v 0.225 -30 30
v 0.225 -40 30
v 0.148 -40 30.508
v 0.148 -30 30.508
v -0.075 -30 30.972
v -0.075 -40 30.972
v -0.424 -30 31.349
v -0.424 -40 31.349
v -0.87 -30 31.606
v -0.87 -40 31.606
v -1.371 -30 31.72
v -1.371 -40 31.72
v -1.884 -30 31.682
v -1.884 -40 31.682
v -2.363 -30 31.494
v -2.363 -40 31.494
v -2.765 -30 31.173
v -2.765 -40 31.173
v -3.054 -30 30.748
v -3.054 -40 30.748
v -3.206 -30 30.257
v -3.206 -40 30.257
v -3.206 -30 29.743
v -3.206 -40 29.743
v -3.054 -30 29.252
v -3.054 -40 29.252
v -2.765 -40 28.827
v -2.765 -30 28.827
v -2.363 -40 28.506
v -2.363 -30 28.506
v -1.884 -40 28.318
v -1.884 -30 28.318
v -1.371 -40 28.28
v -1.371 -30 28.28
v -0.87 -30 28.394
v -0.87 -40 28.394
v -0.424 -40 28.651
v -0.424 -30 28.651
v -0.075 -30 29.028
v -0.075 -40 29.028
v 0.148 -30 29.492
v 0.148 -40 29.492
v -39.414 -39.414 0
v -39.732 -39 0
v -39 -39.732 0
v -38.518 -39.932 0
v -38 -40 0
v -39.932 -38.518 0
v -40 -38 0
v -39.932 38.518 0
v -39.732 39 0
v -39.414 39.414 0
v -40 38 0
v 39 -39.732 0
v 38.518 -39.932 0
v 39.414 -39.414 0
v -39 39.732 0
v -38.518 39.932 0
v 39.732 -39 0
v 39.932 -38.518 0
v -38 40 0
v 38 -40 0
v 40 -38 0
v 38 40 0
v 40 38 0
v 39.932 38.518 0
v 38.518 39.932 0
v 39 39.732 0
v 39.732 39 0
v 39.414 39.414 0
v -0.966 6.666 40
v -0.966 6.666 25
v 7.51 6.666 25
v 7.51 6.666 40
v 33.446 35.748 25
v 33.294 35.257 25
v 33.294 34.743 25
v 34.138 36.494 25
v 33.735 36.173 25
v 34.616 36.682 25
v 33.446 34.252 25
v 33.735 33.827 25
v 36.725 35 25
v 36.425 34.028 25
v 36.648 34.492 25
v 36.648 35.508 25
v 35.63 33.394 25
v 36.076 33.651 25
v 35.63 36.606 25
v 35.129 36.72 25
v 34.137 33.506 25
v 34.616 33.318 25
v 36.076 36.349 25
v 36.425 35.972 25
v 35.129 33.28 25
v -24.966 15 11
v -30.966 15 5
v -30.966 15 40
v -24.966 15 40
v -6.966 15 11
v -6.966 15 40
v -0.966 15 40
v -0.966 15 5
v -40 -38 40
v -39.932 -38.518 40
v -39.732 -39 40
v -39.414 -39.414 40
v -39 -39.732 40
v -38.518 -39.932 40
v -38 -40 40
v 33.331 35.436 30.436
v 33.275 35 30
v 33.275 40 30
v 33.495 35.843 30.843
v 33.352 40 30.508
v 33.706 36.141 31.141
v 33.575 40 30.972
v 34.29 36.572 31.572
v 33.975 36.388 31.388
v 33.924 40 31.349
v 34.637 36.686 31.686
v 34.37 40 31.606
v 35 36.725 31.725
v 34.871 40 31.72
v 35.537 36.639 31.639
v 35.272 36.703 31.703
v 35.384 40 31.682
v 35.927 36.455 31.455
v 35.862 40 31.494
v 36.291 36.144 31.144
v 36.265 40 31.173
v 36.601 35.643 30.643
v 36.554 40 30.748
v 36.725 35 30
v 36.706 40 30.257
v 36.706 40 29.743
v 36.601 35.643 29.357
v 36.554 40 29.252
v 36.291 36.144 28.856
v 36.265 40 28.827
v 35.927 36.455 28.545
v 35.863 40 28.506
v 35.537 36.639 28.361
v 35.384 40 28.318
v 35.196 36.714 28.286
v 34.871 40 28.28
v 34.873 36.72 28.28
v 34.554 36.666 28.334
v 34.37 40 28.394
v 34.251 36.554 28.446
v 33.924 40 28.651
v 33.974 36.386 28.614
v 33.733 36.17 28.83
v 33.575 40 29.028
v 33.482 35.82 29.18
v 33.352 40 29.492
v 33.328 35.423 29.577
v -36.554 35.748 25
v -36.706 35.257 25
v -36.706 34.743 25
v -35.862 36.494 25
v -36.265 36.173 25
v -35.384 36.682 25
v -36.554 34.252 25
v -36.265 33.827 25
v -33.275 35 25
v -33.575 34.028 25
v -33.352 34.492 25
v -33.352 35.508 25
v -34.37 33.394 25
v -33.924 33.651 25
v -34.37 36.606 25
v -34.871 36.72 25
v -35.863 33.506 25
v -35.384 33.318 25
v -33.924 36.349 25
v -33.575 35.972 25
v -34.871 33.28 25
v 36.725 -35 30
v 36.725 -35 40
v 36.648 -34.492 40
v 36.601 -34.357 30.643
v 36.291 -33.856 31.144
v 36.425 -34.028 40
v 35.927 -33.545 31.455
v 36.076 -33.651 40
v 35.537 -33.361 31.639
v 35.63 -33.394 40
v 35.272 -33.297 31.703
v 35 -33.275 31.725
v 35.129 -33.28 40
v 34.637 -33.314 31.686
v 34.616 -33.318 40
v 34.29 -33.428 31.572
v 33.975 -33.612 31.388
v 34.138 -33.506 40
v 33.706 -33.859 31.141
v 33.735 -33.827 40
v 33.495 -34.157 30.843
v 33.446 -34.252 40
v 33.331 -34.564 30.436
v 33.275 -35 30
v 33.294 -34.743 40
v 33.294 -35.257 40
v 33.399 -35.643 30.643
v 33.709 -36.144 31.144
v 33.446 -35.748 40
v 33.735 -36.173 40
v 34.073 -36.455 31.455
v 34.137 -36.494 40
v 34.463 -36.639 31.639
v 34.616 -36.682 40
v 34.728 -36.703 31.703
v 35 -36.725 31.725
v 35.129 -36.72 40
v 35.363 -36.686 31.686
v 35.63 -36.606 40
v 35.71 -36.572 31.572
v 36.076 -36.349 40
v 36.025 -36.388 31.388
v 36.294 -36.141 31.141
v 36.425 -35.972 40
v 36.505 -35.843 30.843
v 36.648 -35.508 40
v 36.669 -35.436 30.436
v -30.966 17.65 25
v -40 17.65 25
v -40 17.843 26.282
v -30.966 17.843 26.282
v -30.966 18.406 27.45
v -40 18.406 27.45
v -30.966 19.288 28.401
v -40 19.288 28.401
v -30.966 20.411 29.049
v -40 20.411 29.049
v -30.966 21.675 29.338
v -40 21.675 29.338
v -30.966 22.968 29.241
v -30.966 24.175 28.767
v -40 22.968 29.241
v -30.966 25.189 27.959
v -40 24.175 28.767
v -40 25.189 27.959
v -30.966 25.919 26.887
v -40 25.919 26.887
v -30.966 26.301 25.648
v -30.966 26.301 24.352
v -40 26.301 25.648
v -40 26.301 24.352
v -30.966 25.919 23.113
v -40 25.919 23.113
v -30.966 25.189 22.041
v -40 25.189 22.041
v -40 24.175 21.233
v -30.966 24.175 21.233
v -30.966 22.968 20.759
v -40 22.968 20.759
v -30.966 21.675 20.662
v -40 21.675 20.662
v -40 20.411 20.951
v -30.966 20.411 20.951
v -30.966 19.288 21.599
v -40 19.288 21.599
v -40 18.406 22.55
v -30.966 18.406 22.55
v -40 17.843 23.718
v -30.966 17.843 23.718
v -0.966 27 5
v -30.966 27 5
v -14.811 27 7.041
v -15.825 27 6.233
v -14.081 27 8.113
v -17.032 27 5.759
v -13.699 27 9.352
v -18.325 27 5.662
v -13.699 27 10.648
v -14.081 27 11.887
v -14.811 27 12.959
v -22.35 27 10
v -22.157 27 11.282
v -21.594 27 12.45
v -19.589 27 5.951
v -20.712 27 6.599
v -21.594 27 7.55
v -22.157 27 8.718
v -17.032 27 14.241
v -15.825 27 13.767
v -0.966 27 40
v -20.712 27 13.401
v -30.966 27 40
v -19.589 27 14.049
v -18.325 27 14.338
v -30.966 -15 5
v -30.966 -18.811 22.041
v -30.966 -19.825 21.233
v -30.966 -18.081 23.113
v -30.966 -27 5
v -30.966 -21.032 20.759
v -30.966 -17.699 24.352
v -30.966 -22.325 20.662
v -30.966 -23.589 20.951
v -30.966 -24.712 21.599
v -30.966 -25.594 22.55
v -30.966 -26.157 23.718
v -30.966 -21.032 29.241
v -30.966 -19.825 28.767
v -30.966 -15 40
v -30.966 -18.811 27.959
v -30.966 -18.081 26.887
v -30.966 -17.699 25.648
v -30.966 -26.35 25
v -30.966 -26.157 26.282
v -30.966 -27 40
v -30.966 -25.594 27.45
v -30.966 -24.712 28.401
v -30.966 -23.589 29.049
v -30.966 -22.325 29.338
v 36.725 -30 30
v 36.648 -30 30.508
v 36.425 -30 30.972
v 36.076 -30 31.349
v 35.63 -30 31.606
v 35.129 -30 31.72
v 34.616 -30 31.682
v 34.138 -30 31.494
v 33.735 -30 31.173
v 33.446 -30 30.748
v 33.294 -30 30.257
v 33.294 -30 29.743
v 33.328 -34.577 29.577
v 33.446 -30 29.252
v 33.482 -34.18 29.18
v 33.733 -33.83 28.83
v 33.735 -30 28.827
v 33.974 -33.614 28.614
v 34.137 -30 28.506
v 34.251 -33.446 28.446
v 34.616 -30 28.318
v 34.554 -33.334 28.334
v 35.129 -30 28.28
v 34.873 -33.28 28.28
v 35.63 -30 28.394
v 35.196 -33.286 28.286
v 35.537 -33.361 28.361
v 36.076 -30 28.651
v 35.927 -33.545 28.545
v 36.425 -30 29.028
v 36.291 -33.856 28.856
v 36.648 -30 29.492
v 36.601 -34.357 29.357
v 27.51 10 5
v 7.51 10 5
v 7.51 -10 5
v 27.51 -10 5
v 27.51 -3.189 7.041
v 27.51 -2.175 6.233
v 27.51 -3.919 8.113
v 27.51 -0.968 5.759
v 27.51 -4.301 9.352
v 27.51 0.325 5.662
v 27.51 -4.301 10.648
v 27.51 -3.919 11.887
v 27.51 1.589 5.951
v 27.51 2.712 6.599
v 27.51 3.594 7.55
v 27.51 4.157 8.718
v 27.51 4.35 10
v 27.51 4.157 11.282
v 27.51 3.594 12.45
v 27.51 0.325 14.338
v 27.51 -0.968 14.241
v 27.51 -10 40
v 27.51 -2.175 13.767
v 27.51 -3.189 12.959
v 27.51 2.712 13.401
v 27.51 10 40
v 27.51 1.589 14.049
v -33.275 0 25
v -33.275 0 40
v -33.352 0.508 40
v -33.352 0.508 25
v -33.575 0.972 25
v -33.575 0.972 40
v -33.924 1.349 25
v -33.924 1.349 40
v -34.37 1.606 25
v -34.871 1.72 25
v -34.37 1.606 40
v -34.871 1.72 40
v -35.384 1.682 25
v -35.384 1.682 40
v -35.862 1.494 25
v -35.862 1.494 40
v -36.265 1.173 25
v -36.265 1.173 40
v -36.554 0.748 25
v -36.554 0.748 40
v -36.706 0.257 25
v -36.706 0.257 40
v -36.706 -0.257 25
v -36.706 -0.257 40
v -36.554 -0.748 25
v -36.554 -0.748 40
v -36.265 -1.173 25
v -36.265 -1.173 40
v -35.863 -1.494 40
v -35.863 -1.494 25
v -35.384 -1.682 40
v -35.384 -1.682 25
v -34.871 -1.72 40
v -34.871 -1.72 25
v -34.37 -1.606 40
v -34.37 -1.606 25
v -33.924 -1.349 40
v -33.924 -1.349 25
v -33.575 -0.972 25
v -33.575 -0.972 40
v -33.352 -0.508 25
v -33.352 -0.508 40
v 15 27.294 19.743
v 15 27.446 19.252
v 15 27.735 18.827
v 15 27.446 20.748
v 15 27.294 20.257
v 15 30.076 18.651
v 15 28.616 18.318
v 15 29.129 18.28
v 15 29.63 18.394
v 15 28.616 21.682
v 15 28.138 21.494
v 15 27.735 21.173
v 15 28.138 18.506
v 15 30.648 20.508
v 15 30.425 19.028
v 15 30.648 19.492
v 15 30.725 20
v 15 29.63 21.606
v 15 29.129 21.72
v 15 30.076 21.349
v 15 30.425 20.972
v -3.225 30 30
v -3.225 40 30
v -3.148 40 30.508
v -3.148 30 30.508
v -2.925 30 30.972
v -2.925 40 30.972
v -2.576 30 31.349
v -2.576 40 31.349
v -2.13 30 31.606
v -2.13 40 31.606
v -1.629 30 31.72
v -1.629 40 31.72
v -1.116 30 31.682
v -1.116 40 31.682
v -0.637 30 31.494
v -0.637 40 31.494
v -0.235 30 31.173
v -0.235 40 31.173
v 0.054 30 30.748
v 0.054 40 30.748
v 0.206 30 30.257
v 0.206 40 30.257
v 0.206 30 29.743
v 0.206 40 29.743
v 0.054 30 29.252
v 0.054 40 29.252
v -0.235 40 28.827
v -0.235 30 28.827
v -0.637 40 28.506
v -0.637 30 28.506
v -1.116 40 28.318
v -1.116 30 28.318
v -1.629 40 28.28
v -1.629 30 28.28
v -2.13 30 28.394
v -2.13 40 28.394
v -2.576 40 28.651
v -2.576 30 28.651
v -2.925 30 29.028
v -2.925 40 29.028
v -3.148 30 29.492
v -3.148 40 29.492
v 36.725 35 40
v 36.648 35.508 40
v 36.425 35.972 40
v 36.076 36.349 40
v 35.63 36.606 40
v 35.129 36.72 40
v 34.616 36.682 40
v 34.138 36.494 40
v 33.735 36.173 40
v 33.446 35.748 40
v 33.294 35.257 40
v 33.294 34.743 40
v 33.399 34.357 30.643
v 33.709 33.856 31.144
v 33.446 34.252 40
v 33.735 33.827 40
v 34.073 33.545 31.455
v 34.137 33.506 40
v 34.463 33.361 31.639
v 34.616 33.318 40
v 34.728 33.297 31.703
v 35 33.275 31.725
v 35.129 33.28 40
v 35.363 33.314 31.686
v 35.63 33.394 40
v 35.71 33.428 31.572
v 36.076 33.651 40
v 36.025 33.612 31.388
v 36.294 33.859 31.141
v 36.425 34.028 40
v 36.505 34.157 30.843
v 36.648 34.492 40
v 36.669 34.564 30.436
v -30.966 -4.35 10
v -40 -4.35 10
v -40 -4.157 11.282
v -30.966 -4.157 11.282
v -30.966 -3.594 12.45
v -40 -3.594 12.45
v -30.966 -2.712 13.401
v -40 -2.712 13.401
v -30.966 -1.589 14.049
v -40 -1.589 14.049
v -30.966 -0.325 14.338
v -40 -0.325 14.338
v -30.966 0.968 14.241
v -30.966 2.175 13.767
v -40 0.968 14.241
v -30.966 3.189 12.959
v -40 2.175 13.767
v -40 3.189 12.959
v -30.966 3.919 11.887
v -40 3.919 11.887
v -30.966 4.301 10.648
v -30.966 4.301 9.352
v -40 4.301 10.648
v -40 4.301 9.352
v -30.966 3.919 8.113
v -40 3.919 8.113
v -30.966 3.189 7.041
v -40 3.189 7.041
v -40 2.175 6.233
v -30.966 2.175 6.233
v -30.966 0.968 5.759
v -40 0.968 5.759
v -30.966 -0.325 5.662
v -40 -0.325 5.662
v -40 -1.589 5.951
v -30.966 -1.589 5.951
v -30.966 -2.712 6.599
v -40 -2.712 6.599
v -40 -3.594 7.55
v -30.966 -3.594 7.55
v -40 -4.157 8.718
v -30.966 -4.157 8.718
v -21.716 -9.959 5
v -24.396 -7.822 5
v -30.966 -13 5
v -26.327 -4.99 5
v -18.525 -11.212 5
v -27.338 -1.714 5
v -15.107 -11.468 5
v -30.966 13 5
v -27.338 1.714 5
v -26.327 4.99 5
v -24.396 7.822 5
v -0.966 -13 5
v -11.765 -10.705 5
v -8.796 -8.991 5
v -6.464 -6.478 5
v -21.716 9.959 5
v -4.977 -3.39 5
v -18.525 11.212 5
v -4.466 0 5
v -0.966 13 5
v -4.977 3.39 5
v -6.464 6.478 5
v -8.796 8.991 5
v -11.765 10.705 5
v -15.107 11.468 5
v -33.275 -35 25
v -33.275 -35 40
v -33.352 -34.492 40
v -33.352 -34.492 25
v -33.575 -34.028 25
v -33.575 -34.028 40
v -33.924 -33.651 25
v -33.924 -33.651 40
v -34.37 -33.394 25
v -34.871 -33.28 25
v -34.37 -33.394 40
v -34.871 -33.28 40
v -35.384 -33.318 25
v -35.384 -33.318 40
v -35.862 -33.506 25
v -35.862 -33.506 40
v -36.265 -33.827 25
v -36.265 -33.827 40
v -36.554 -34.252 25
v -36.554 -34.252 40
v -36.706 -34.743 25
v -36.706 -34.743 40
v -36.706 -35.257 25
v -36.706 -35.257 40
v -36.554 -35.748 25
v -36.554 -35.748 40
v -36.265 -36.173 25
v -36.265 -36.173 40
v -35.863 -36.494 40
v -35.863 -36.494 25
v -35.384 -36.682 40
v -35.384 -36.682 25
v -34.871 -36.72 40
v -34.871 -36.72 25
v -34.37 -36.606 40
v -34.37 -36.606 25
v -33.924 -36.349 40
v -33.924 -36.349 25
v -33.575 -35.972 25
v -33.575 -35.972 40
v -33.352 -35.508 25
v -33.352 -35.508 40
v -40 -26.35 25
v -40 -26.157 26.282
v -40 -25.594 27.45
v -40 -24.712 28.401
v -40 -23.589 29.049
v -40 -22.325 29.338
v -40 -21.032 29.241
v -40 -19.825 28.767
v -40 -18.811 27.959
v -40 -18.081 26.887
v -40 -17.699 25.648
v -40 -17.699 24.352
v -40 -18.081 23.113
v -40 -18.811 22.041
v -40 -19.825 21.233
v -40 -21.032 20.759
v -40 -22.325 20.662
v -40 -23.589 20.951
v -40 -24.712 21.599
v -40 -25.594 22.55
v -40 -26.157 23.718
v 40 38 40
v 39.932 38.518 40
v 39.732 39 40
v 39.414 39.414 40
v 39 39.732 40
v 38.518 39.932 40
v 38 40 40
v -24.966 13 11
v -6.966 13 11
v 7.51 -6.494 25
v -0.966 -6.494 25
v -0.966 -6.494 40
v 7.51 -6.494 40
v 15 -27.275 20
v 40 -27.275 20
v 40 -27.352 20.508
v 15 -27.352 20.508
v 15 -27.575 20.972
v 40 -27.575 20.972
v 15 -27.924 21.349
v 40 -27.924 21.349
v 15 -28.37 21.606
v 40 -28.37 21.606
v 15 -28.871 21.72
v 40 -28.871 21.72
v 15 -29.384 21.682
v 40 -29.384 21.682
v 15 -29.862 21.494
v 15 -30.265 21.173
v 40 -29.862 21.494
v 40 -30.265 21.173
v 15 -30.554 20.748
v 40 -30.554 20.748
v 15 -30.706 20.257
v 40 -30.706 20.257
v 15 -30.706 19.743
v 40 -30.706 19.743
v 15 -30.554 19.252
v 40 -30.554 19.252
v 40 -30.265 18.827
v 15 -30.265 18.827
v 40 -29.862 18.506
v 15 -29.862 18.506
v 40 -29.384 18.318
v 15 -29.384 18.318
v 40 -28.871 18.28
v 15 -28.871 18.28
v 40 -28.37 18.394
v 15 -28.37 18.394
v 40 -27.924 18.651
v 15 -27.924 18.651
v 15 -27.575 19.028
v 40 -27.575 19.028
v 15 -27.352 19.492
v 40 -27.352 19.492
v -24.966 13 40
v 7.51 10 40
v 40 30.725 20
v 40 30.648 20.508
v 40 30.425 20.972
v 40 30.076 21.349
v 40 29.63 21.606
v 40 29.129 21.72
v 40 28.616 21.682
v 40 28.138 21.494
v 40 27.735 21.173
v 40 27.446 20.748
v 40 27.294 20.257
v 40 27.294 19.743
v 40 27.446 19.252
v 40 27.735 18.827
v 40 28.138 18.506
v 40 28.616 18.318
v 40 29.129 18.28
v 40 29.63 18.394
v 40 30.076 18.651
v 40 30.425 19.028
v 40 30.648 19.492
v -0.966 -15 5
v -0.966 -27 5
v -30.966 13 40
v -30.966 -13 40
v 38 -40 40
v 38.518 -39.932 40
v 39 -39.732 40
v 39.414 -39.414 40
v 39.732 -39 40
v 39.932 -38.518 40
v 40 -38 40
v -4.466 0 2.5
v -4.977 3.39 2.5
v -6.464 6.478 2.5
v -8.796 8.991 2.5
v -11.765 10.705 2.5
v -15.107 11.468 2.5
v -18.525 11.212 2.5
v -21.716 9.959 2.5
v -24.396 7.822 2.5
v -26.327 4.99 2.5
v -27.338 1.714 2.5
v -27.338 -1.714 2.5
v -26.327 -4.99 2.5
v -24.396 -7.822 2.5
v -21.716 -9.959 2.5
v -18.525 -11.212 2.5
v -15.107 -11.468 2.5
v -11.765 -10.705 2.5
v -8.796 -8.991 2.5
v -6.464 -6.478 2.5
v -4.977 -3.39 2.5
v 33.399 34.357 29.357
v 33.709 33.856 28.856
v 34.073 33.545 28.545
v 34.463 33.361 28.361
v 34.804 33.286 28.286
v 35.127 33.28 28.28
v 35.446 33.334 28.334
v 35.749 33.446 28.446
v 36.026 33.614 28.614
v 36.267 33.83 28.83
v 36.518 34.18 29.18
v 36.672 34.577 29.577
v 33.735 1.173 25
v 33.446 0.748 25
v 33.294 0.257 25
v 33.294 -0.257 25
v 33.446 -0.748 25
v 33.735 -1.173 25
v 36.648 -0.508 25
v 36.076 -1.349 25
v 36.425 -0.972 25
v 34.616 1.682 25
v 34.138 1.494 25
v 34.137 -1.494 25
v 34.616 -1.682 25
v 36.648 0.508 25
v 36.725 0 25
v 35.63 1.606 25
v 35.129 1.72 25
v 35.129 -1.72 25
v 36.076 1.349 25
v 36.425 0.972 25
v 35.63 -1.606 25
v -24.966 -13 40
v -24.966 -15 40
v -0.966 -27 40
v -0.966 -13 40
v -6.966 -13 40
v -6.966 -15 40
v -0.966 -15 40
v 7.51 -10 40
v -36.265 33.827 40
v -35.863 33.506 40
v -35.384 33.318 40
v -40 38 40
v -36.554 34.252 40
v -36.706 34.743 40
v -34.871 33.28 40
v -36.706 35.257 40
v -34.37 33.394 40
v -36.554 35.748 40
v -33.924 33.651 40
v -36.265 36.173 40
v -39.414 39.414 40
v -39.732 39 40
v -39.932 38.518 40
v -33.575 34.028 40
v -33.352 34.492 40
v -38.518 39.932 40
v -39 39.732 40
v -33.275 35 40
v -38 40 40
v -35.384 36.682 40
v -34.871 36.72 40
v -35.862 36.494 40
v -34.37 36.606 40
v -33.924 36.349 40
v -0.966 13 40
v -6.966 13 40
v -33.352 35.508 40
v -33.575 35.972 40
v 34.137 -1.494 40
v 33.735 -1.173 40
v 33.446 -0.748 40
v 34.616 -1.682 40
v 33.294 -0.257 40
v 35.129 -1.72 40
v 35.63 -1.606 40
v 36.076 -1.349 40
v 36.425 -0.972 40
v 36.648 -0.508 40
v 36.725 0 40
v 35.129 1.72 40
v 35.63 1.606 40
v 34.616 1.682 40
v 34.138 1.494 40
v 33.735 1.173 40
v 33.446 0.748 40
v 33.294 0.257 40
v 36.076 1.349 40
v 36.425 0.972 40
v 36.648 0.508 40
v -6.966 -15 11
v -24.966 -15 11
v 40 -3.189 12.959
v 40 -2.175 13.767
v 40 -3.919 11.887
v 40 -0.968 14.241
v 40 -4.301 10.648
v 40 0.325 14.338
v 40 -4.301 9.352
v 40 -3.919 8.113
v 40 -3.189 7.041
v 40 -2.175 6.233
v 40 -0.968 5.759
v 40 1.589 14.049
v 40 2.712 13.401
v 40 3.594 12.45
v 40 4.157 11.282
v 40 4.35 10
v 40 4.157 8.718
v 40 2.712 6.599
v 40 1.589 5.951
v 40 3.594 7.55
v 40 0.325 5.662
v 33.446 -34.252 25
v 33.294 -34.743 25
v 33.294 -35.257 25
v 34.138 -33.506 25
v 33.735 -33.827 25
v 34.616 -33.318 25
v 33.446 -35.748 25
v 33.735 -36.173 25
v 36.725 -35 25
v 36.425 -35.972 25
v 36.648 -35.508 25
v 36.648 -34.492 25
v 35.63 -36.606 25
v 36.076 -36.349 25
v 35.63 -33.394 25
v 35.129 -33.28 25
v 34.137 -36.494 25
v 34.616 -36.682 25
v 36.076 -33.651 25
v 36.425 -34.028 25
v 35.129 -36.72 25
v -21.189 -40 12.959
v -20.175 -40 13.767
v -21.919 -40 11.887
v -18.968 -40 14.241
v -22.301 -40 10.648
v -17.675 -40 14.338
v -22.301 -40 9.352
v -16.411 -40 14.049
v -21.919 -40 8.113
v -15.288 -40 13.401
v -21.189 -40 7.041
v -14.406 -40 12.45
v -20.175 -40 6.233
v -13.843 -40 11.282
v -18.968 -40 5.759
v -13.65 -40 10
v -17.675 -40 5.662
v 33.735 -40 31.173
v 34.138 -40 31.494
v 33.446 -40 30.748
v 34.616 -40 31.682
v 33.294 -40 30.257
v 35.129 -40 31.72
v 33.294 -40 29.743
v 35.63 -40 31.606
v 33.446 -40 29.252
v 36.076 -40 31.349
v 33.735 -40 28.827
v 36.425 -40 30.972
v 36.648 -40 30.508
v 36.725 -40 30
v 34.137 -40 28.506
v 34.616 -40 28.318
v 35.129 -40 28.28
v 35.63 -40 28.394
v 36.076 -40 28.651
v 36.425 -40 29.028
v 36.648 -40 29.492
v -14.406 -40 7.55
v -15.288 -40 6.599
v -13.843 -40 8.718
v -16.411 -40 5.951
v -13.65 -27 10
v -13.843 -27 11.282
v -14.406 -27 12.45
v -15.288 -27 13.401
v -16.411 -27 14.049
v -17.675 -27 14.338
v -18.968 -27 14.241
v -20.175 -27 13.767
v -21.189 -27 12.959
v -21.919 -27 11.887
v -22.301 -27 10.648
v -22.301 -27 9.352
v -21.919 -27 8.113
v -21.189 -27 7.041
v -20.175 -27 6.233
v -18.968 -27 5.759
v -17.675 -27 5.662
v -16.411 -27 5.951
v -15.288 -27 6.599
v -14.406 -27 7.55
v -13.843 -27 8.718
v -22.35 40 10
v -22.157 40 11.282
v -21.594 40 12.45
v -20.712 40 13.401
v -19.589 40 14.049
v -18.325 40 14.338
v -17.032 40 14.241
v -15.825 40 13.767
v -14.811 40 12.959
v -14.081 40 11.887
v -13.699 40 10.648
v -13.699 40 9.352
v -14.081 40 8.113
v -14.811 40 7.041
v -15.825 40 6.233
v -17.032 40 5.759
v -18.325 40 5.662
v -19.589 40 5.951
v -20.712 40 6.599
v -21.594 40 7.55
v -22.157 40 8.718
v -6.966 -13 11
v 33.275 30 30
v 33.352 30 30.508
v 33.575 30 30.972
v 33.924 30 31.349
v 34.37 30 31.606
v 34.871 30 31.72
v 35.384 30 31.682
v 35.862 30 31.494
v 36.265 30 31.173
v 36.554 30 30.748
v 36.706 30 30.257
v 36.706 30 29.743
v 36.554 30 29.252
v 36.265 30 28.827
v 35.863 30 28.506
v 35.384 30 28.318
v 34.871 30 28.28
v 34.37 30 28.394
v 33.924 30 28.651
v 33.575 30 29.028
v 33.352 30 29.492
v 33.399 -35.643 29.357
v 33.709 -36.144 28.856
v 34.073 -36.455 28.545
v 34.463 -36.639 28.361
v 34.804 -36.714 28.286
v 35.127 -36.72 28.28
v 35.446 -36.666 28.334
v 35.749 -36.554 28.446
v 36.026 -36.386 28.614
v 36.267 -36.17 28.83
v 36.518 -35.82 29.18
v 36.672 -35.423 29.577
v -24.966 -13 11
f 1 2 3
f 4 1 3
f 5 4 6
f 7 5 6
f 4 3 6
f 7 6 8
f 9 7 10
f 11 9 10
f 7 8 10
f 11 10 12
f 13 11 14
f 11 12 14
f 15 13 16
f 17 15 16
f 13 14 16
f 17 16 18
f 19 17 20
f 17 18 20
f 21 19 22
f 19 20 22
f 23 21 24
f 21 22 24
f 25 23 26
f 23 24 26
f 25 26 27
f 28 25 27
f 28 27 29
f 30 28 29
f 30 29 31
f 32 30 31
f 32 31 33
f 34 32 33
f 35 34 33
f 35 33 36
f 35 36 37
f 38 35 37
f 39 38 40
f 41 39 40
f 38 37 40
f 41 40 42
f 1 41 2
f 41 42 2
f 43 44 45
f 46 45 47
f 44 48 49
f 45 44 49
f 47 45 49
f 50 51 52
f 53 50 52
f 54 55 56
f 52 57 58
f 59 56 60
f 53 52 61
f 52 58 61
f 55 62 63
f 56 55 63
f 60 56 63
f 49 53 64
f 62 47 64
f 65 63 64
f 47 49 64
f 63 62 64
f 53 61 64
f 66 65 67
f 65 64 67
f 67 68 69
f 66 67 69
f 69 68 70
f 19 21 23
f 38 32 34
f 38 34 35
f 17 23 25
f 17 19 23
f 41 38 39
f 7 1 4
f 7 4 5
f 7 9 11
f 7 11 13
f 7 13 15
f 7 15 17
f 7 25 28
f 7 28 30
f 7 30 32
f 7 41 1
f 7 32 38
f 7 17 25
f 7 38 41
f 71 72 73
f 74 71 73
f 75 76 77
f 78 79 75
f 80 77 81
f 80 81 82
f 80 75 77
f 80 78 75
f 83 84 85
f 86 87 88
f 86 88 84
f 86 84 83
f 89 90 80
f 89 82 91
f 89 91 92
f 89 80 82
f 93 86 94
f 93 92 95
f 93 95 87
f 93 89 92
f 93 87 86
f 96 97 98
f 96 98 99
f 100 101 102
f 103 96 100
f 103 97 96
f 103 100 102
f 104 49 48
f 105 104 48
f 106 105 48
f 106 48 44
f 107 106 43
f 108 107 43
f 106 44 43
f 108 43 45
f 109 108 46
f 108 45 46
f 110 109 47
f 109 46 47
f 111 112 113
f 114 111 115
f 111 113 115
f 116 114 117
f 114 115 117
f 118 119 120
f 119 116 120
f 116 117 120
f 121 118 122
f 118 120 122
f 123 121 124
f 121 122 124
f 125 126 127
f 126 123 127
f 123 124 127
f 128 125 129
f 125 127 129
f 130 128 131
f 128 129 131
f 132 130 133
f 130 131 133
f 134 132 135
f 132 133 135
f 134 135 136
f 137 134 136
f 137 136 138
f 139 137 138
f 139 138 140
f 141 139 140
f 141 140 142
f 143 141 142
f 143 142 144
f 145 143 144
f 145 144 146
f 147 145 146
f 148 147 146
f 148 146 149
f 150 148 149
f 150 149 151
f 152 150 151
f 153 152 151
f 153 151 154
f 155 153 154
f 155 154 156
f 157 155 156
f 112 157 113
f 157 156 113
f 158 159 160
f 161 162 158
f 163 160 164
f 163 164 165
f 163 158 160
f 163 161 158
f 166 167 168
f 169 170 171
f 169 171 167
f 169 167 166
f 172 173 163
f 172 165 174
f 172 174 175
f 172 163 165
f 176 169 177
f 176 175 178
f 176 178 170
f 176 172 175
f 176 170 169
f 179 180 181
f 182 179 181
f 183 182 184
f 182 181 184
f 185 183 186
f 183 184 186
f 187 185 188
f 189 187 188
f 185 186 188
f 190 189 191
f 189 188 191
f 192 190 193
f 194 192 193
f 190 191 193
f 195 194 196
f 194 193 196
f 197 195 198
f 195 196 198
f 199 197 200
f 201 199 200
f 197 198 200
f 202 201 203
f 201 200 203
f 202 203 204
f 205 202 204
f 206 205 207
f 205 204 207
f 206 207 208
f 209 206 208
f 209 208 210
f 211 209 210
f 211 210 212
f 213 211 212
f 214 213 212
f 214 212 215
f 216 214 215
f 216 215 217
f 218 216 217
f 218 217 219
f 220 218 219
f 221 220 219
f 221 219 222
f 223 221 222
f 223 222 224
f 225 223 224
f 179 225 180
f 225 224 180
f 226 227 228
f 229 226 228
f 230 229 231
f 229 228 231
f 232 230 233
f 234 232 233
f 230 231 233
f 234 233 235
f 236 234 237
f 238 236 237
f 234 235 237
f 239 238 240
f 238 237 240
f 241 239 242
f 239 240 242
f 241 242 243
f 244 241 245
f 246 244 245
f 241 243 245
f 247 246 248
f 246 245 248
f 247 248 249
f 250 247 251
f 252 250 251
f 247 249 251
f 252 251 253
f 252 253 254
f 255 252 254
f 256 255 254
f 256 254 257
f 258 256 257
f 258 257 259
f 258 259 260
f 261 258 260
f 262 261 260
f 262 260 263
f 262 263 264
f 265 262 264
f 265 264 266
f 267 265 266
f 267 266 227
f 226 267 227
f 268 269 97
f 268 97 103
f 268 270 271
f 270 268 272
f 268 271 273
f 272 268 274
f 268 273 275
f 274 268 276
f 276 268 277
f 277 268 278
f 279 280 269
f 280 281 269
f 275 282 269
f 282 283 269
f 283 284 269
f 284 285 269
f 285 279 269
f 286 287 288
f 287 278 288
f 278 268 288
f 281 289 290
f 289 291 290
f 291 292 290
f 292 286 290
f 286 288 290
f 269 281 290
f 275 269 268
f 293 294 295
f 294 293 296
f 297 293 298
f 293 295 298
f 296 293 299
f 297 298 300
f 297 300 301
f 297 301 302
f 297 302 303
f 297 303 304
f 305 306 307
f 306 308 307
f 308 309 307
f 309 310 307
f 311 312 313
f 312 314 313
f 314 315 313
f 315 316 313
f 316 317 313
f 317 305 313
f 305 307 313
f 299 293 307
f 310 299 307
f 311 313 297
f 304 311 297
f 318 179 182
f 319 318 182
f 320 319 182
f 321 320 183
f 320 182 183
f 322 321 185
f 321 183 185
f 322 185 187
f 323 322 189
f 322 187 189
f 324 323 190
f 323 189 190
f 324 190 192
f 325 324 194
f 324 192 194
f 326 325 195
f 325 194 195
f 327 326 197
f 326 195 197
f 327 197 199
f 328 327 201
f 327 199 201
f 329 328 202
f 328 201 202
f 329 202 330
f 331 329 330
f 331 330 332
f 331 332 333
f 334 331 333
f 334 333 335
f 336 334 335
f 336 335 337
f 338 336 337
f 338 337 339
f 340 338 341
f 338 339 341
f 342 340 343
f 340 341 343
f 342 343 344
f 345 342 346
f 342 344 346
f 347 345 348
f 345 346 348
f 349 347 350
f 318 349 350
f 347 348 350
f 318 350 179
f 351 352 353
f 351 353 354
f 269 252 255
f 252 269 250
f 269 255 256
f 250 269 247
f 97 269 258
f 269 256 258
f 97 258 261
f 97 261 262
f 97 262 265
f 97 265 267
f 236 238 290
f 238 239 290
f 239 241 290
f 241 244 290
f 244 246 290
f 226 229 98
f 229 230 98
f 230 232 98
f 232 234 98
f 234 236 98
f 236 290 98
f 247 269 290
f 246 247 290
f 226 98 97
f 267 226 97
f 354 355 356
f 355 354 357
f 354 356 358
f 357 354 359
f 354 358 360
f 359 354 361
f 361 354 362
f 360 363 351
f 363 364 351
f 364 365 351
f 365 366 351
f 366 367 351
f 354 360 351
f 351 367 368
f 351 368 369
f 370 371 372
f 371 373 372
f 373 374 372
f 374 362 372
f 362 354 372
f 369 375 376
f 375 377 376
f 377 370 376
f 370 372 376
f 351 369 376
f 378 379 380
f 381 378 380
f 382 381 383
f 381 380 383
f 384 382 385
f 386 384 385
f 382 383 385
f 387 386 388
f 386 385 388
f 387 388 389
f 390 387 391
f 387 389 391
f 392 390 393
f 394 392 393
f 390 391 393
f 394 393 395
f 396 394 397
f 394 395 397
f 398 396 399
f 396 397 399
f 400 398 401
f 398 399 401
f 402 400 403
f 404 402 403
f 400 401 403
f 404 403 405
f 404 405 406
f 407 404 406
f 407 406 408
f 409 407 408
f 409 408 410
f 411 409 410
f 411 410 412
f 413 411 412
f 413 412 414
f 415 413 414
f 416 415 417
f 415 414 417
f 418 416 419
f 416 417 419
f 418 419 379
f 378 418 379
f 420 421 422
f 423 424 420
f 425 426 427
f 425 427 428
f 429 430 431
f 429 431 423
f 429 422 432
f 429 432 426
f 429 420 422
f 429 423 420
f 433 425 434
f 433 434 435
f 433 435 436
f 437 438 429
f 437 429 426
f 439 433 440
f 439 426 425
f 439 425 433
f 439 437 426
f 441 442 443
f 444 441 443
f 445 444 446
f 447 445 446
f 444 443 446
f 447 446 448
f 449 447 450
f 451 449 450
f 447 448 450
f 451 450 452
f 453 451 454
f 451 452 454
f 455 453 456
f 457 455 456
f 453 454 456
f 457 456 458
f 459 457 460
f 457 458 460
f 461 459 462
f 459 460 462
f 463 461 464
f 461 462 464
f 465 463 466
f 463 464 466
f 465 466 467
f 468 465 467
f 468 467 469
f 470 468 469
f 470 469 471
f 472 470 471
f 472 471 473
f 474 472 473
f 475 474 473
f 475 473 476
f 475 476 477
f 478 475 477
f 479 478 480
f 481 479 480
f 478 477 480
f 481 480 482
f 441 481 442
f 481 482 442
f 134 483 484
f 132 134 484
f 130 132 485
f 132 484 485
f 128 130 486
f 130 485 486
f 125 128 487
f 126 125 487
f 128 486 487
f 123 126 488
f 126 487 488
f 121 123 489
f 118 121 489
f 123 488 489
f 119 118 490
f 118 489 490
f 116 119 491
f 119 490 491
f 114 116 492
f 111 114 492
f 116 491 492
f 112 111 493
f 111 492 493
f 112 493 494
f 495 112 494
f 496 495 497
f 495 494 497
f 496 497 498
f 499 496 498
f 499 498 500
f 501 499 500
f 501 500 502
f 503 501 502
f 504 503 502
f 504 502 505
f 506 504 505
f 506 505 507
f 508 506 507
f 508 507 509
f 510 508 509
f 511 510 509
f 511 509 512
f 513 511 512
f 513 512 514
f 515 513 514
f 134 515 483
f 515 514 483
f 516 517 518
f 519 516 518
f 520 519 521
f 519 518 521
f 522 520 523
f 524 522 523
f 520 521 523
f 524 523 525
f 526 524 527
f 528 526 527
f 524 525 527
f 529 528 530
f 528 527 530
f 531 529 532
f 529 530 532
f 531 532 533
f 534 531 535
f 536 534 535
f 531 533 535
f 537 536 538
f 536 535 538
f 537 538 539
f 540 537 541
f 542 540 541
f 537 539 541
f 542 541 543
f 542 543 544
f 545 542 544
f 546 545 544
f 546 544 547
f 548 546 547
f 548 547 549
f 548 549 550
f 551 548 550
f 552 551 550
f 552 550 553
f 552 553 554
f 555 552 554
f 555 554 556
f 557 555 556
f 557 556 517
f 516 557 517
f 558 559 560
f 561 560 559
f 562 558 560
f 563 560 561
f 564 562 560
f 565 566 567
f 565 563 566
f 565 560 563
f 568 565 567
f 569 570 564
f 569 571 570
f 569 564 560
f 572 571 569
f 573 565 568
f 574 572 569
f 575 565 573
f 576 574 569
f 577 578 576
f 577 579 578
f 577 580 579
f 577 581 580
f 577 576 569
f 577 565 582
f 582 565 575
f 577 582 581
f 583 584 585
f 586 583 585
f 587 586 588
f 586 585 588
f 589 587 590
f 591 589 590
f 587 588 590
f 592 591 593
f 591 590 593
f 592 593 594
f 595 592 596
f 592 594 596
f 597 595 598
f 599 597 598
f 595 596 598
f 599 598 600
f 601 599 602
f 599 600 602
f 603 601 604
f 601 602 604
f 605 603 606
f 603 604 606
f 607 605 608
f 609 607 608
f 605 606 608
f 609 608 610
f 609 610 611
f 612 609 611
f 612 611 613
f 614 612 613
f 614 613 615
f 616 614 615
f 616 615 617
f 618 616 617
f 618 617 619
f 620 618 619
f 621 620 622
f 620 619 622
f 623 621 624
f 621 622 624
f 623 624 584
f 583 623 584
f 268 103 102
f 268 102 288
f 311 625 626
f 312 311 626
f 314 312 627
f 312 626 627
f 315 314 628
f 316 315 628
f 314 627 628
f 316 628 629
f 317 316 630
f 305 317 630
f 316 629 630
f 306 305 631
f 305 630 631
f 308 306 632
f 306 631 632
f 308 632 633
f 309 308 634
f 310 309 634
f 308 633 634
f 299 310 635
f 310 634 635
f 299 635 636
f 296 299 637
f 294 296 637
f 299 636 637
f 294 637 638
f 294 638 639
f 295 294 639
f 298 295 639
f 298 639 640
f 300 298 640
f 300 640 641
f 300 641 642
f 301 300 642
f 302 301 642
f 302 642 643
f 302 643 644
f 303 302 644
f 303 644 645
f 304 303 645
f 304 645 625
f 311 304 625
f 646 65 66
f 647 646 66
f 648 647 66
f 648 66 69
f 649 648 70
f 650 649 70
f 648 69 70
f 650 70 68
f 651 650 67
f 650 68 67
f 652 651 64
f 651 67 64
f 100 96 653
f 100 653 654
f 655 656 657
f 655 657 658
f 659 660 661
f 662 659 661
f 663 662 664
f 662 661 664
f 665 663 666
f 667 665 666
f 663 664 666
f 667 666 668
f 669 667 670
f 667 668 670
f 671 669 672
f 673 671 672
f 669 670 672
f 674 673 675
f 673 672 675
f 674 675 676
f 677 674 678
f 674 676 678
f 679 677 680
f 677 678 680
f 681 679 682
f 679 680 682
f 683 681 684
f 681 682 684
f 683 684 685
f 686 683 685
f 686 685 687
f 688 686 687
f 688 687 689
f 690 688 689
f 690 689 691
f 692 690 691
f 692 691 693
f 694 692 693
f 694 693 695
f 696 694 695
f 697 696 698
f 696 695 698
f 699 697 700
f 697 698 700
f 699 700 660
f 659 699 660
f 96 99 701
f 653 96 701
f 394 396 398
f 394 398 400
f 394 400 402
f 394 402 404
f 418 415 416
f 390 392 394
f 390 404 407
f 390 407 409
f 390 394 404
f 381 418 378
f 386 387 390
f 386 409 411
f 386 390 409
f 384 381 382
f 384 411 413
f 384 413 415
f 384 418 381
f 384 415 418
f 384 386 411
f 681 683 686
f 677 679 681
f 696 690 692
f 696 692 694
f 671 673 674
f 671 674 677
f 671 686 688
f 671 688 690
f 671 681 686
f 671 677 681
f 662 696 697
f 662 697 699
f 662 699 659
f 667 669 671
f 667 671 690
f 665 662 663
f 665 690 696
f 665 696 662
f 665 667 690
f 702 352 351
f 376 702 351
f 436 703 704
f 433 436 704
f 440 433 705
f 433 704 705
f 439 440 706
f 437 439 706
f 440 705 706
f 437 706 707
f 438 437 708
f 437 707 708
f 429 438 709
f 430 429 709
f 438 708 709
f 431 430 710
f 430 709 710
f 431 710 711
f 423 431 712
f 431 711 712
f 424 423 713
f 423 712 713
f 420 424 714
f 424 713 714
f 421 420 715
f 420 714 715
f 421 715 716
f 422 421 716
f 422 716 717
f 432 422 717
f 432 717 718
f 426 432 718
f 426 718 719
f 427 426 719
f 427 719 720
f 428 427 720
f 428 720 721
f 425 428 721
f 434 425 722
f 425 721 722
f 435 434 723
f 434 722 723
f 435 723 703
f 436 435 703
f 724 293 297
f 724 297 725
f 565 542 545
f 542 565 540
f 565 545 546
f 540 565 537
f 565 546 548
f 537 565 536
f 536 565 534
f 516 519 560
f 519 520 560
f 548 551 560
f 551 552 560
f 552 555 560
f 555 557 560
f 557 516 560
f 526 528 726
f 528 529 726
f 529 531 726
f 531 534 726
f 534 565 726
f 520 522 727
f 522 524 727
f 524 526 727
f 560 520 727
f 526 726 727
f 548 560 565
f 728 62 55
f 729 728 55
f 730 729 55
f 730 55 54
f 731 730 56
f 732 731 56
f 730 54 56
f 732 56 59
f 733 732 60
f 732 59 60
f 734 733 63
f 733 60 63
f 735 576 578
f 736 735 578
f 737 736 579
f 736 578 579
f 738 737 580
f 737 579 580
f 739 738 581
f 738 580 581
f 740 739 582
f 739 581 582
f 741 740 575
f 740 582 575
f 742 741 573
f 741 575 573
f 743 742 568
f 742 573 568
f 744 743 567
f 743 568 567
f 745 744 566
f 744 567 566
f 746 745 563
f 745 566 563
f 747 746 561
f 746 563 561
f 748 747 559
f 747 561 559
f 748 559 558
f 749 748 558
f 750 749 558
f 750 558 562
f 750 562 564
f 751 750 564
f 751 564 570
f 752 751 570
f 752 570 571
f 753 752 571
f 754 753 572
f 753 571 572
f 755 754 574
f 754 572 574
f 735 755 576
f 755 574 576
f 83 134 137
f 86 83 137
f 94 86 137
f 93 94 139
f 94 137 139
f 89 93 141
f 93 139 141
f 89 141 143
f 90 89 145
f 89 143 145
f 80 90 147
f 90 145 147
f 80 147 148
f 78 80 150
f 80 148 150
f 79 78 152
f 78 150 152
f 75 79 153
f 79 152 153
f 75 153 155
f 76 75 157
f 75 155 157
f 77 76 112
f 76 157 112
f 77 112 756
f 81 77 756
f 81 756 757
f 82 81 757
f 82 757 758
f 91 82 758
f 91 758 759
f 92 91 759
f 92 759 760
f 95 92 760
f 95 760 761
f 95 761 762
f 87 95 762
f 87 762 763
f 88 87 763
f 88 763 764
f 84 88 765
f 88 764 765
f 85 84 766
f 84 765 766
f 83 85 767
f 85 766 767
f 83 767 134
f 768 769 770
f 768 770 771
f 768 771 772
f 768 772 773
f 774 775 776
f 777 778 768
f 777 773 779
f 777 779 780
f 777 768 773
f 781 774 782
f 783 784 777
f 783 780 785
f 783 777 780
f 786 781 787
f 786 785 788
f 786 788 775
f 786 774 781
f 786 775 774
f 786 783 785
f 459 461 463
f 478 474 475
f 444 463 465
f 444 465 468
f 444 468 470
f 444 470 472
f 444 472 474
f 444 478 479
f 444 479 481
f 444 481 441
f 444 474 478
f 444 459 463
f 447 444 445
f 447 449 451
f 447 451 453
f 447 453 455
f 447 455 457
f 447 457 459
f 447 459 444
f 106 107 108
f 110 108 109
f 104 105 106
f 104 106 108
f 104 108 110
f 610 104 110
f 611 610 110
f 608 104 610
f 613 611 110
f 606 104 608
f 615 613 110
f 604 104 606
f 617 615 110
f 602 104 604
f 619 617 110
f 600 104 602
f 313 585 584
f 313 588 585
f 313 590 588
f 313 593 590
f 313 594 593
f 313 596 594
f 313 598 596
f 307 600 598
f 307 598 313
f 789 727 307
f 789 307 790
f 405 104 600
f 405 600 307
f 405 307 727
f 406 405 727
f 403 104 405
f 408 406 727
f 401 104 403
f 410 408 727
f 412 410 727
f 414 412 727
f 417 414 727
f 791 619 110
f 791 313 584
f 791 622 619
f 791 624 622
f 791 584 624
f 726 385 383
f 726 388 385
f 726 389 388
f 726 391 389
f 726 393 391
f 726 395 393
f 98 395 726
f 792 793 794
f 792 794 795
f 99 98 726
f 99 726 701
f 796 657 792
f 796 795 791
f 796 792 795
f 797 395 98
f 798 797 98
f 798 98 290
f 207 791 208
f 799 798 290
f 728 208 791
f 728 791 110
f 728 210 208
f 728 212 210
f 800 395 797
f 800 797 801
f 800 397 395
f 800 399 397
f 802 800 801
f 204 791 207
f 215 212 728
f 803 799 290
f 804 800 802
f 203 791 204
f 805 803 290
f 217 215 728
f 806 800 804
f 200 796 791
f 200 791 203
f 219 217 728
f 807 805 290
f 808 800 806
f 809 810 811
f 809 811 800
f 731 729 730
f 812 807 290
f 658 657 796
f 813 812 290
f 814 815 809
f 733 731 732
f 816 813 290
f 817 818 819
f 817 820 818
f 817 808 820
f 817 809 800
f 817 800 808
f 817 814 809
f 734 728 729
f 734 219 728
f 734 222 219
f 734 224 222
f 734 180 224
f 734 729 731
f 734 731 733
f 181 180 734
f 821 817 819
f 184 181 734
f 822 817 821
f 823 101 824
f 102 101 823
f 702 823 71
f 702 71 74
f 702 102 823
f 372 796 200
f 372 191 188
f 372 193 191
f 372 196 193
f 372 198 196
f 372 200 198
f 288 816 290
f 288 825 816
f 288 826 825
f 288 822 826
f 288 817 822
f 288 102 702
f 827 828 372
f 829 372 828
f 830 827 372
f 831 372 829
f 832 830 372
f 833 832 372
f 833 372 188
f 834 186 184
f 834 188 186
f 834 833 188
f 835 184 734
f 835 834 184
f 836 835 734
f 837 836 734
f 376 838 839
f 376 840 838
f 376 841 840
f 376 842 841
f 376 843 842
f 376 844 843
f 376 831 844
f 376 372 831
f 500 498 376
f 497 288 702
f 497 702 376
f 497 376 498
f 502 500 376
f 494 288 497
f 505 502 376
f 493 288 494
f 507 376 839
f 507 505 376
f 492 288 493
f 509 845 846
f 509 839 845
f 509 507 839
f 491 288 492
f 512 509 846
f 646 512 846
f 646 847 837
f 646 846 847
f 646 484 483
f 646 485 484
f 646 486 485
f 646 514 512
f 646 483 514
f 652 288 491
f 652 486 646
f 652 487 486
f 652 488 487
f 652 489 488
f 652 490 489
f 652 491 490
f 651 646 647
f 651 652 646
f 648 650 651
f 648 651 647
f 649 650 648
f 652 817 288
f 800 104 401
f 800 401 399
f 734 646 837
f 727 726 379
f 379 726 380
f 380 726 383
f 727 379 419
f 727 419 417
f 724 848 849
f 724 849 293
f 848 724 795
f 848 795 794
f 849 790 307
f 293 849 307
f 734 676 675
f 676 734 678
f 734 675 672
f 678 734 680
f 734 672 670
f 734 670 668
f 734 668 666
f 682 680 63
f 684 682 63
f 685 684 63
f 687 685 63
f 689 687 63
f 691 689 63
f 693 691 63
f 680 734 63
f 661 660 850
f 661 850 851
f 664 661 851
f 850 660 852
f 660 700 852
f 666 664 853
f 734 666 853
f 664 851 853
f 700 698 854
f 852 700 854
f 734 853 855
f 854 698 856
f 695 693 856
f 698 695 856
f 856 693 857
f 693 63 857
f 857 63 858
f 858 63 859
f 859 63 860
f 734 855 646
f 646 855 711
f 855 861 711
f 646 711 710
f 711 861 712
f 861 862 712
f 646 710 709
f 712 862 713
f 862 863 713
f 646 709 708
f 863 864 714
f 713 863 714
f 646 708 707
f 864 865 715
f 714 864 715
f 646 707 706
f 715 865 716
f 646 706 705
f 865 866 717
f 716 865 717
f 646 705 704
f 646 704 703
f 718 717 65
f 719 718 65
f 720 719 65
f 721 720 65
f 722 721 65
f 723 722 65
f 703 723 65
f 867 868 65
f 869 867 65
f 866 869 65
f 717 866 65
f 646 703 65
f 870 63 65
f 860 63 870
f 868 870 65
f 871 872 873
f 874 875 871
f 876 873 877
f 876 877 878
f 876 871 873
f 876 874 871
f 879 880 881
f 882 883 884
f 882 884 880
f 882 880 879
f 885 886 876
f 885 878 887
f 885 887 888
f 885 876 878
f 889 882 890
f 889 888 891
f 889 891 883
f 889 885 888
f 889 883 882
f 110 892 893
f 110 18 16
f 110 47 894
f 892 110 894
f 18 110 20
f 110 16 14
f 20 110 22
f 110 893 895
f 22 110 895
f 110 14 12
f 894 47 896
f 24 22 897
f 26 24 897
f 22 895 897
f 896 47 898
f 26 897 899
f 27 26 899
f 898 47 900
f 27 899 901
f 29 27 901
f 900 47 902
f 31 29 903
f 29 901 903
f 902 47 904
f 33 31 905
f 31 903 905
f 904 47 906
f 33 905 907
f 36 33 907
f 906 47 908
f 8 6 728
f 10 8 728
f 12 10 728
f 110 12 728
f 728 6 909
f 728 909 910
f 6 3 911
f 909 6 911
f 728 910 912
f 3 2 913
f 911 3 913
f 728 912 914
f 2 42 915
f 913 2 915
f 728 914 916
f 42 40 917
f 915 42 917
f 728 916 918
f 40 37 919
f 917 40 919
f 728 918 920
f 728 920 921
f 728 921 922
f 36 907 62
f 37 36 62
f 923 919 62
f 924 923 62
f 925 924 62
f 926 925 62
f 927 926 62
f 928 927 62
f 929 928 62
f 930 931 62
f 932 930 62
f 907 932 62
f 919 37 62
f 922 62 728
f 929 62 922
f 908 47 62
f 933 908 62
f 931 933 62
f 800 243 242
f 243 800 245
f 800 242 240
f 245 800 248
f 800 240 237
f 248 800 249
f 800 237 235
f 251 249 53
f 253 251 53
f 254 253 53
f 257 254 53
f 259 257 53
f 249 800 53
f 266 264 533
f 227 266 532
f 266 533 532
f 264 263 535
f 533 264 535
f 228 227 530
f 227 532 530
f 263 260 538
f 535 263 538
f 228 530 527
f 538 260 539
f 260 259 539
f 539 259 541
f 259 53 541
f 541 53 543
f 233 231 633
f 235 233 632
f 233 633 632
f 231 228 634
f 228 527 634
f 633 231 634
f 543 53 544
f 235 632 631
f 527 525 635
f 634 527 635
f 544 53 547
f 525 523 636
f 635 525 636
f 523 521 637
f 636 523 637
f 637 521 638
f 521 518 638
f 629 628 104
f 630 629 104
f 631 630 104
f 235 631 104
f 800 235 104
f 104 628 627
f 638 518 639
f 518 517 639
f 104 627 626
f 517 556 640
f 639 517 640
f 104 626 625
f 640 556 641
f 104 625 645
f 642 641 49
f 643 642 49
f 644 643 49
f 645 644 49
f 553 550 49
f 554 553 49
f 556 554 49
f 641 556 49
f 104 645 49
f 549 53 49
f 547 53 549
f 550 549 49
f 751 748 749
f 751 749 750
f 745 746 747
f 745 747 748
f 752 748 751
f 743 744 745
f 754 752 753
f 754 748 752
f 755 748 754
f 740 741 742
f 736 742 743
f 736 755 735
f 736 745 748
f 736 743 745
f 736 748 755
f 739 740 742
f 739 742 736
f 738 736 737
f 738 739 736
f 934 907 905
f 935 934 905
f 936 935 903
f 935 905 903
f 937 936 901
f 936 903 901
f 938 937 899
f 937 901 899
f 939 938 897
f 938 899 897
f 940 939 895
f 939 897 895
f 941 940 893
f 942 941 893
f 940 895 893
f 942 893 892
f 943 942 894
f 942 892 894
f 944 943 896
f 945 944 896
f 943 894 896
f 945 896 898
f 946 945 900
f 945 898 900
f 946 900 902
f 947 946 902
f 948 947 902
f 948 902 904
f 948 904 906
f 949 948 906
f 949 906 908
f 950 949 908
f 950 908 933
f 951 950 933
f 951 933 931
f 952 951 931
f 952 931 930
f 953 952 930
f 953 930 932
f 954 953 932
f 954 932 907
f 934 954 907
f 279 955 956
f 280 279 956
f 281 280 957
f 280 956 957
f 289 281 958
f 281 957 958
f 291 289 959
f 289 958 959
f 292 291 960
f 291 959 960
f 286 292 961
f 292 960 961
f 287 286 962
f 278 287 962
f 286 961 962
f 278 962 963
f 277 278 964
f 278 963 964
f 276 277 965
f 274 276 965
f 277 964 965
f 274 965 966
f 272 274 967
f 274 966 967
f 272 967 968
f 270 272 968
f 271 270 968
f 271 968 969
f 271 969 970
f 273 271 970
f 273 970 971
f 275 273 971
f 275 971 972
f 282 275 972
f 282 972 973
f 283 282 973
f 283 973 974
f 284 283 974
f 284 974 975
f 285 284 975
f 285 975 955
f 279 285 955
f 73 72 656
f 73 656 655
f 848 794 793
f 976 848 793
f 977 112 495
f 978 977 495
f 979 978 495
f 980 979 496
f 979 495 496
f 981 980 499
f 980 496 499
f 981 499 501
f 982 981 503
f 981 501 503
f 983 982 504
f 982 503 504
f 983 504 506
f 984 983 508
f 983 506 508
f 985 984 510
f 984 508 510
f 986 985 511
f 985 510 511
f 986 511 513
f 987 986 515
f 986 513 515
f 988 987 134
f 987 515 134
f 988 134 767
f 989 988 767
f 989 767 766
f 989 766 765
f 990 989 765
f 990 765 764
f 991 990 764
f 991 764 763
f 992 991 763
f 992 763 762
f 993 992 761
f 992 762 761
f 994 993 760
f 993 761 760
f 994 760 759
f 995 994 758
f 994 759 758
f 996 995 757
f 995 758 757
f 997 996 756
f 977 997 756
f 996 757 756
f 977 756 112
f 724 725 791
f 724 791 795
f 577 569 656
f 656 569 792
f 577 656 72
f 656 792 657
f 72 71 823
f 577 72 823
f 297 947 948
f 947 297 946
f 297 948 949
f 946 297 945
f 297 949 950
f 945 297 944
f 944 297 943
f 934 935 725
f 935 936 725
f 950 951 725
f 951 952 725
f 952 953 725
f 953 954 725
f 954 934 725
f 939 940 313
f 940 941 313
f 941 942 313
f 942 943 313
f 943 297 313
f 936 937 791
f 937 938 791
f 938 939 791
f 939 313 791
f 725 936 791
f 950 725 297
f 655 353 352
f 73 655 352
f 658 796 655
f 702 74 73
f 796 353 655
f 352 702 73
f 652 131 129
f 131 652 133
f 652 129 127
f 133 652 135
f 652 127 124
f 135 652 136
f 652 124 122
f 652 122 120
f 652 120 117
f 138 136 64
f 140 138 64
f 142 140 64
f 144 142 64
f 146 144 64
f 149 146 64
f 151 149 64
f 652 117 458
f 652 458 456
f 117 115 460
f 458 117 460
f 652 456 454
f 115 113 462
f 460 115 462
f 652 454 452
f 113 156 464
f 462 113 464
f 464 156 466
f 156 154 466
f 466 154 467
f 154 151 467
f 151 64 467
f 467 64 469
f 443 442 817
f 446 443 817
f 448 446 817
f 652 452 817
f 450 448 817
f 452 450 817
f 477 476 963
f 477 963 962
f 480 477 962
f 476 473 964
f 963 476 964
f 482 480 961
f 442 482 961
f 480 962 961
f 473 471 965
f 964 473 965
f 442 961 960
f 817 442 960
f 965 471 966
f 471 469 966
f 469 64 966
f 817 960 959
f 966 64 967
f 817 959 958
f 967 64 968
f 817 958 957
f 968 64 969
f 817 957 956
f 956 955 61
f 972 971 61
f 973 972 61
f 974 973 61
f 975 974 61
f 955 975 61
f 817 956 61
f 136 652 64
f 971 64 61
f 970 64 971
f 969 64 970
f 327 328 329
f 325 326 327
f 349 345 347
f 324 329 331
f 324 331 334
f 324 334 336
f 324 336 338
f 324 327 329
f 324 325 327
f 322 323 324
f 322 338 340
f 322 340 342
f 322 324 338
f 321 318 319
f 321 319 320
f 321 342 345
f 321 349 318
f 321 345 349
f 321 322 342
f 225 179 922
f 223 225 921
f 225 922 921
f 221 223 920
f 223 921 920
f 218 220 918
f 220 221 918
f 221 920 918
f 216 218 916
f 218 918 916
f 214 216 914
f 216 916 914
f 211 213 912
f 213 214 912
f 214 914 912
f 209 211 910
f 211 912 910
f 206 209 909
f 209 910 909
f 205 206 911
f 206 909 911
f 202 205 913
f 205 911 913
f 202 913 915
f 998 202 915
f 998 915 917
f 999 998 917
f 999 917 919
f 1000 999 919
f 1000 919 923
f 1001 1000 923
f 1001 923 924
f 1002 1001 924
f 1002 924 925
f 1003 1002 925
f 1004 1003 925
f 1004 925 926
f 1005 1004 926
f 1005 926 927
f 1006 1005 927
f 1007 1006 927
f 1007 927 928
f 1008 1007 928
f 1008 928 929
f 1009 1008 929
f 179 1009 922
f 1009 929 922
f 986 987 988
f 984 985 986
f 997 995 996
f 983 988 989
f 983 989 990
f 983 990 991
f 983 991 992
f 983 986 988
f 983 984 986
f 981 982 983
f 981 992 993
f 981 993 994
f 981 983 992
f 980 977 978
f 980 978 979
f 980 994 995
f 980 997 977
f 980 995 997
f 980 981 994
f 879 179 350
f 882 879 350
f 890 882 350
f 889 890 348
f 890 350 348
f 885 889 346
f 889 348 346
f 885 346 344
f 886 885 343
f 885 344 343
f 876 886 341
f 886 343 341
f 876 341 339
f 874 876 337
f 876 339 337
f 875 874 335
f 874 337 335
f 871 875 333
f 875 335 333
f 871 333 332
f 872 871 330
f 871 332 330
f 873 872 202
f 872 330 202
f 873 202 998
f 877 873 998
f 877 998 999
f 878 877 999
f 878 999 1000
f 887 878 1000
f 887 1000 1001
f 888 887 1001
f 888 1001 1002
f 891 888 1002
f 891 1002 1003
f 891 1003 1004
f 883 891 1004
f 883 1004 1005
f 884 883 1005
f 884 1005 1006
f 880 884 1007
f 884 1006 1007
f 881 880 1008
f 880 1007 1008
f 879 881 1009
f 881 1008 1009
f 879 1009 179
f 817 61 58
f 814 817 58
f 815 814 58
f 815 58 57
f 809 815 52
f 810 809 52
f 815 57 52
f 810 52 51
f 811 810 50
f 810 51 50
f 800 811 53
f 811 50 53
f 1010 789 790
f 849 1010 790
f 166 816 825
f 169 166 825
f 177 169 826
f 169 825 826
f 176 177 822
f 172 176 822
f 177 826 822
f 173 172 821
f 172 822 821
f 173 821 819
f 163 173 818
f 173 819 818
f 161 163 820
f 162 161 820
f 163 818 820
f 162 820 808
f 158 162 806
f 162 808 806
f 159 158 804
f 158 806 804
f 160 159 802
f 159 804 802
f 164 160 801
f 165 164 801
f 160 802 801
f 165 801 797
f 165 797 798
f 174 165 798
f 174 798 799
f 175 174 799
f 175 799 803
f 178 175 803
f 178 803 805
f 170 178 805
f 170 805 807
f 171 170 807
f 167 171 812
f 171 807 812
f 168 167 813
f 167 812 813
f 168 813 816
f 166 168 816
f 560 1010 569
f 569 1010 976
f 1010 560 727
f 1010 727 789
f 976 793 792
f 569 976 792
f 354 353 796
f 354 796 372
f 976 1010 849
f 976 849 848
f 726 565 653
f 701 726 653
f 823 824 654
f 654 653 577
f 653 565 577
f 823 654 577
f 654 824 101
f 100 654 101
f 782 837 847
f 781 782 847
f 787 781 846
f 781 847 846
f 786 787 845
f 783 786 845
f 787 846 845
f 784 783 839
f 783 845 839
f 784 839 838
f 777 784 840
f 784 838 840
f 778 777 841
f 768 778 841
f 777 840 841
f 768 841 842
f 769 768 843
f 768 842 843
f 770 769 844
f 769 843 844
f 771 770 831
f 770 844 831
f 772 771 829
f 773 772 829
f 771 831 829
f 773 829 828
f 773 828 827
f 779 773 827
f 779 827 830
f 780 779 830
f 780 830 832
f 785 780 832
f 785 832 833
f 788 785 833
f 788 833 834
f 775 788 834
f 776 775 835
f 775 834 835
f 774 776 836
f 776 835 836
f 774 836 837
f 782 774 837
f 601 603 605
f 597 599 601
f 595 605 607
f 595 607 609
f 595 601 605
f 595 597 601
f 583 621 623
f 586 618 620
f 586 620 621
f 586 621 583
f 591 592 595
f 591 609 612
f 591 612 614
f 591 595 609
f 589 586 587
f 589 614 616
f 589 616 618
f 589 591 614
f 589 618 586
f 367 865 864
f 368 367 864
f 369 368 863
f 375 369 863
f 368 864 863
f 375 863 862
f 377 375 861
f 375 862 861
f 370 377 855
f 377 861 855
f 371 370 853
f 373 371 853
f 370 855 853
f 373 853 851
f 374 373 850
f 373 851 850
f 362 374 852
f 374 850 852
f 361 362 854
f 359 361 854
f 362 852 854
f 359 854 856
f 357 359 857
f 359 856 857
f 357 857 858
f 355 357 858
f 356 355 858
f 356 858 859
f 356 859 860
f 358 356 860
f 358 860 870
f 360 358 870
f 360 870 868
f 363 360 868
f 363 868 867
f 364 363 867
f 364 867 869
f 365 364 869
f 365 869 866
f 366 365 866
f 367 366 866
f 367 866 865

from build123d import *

# Parameters (mm, degrees)
F1_DEPTH  = 40
F2_W      = 20
F2_H      = 20
F3_DEPTH  = 35
F4_R      = 4.35
F5_DEPTH  = 15
F6_R      = 4.35
F7_DEPTH  = 15
F8_W      = 8.4756634911
F8_H      = 13.160008005
F9_DEPTH  = 15
F10_R     = 1.725
F11_DEPTH = 15
F12_R     = 11.5
F13_DEPTH = 2.5
F14_R     = 1.725
F15_DEPTH = 10
F16_R     = 1.725
F17_DEPTH = 10
F18_R     = 1.725
F19_DEPTH = 25
F20_R     = 4.35
F21_DEPTH = 15
F22_R     = 4.35
F23_DEPTH = 15
F24_W     = 18
F24_H     = 2
F25_DEPTH = 6


# Not quite as in the source:
# - a feature names something its author has since deleted; it is built from what else it names


with BuildPart() as f1:
    # F0 (on Top) → F1 (new body)
    with BuildSketch(Plane.XY):
        with BuildLine():
            ThreePointArc((40, 38), (39.4142135624, 39.4142135624), (38, 40))
            Line((38, 40), (-38, 40))
            ThreePointArc((-38, 40), (-39.4142135624, 39.4142135624), (-40, 38))
            Line((-40, 38), (-40, -38))
            ThreePointArc((-40, -38), (-39.4142135624, -39.4142135624), (-38, -40))
            Line((-38, -40), (38, -40))
            ThreePointArc((38, -40), (39.4142135624, -39.4142135624), (40, -38))
            Line((40, -38), (40, 38))
        make_face()
    extrude(amount=F1_DEPTH)

    # F2 (on face) → F3 (cut)
    with BuildSketch(Plane.XY.offset(40)):
        with Locations((17.50956662, 0)):
            Rectangle(F2_W, F2_H)
        Polygon((-24.9660968933, -15), (-30.9660968933, -15), (-30.9660968933, -26.9999999998), (-0.9660968933, -26.9999999998), (-0.9660968933, -15), (-6.9660968933, -15), (-6.9660968933, -13), (-0.9660968933, -13), (-0.9660968933, 13), (-6.9660968933, 13), (-6.9660968933, 15), (-0.9660968933, 15), (-0.9660968933, 26.9999999998), (-30.9660968933, 26.9999999998), (-30.9660968933, 15), (-24.9660968933, 15), (-24.9660968933, 13), (-30.9660968933, 13), (-30.9660968933, -13), (-24.9660968933, -13), align=None)
    extrude(amount=-F3_DEPTH, mode=Mode.SUBTRACT)

    # F4 (on face) → F5 (cut)
    with BuildSketch(Plane(origin=(-40, 0, 0), x_dir=(0, -1, 0), z_dir=(-1, 0, 0))):
        with Locations((-22, 25)):
            Circle(F4_R)
        with Locations((22, 25)):
            Circle(F4_R)
        with Locations((0, 10)):
            Circle(F4_R)
    extrude(amount=-F5_DEPTH, mode=Mode.SUBTRACT)

    # F6 (on face) → F7 (cut)
    with BuildSketch(Plane.YZ.offset(40)):
        with Locations((0, 10)):
            Circle(F6_R)
    extrude(amount=-F7_DEPTH, mode=Mode.SUBTRACT)

    # F8 (on face) → F9 (cut)
    with BuildSketch(Plane.XY.offset(40)):
        with Locations((3.2717348745, 0.0860663135)):
            Rectangle(F8_W, F8_H)
    extrude(amount=-F9_DEPTH, mode=Mode.SUBTRACT)

    # F10 (on face) → F11 (cut)
    with BuildSketch(Plane.XY.offset(40)):
        with Locations((-35, 0)):
            Circle(F10_R)
        with Locations((35, 0)):
            Circle(F10_R)
        with Locations((-35, 35)):
            Circle(F10_R)
        with Locations((-35, -35)):
            Circle(F10_R)
        with Locations((35, 35)):
            Circle(F10_R)
        with Locations((35, -35)):
            Circle(F10_R)
    extrude(amount=-F11_DEPTH, mode=Mode.SUBTRACT)

    # F12 (on face) → F13 (cut)
    with BuildSketch(Plane.XY.offset(5)):
        with Locations((-15.966096893, 0)):
            Circle(F12_R)
    extrude(amount=-F13_DEPTH, mode=Mode.SUBTRACT)

    # F14 (on face) → F15 (cut)
    with BuildSketch(Plane.XZ.offset(40)):
        with Locations((-1.5, 30)):
            Circle(F14_R)
        with Locations((35, 30)):
            Circle(F14_R)
    extrude(amount=-F15_DEPTH, mode=Mode.SUBTRACT)

    # F16 (on face) → F17 (cut)
    with BuildSketch(Plane(origin=(0, 40, 0), x_dir=(-1, 0, 0), z_dir=(0, 1, 0))):
        with Locations((-35, 30)):
            Circle(F16_R)
        with Locations((1.5, 30)):
            Circle(F16_R)
    extrude(amount=-F17_DEPTH, mode=Mode.SUBTRACT)

    # F18 (on face) → F19 (cut)
    with BuildSketch(Plane.YZ.offset(40)):
        with Locations((-29, 20)):
            Circle(F18_R)
        with Locations((29, 20)):
            Circle(F18_R)
    extrude(amount=-F19_DEPTH, mode=Mode.SUBTRACT)

    # F20 (on face) → F21 (cut)
    with BuildSketch(Plane(origin=(0, 40, 0), x_dir=(-1, 0, 0), z_dir=(0, 1, 0))):
        with Locations((18, 10)):
            Circle(F20_R)
    extrude(amount=-F21_DEPTH, mode=Mode.SUBTRACT)

    # F22 (on face) → F23 (cut)
    with BuildSketch(Plane.XZ.offset(40)):
        with Locations((-18, 10)):
            Circle(F22_R)
    extrude(amount=-F23_DEPTH, mode=Mode.SUBTRACT)

    # F24 (on face) → F25 (join)
    with BuildSketch(Plane.XY.offset(5)):
        with Locations((-15.9660968933, 14)):
            Rectangle(F24_W, F24_H)
        with Locations((-15.9660968933, -14)):
            Rectangle(F24_W, F24_H)
    extrude(amount=F25_DEPTH)


solid = f1.part
